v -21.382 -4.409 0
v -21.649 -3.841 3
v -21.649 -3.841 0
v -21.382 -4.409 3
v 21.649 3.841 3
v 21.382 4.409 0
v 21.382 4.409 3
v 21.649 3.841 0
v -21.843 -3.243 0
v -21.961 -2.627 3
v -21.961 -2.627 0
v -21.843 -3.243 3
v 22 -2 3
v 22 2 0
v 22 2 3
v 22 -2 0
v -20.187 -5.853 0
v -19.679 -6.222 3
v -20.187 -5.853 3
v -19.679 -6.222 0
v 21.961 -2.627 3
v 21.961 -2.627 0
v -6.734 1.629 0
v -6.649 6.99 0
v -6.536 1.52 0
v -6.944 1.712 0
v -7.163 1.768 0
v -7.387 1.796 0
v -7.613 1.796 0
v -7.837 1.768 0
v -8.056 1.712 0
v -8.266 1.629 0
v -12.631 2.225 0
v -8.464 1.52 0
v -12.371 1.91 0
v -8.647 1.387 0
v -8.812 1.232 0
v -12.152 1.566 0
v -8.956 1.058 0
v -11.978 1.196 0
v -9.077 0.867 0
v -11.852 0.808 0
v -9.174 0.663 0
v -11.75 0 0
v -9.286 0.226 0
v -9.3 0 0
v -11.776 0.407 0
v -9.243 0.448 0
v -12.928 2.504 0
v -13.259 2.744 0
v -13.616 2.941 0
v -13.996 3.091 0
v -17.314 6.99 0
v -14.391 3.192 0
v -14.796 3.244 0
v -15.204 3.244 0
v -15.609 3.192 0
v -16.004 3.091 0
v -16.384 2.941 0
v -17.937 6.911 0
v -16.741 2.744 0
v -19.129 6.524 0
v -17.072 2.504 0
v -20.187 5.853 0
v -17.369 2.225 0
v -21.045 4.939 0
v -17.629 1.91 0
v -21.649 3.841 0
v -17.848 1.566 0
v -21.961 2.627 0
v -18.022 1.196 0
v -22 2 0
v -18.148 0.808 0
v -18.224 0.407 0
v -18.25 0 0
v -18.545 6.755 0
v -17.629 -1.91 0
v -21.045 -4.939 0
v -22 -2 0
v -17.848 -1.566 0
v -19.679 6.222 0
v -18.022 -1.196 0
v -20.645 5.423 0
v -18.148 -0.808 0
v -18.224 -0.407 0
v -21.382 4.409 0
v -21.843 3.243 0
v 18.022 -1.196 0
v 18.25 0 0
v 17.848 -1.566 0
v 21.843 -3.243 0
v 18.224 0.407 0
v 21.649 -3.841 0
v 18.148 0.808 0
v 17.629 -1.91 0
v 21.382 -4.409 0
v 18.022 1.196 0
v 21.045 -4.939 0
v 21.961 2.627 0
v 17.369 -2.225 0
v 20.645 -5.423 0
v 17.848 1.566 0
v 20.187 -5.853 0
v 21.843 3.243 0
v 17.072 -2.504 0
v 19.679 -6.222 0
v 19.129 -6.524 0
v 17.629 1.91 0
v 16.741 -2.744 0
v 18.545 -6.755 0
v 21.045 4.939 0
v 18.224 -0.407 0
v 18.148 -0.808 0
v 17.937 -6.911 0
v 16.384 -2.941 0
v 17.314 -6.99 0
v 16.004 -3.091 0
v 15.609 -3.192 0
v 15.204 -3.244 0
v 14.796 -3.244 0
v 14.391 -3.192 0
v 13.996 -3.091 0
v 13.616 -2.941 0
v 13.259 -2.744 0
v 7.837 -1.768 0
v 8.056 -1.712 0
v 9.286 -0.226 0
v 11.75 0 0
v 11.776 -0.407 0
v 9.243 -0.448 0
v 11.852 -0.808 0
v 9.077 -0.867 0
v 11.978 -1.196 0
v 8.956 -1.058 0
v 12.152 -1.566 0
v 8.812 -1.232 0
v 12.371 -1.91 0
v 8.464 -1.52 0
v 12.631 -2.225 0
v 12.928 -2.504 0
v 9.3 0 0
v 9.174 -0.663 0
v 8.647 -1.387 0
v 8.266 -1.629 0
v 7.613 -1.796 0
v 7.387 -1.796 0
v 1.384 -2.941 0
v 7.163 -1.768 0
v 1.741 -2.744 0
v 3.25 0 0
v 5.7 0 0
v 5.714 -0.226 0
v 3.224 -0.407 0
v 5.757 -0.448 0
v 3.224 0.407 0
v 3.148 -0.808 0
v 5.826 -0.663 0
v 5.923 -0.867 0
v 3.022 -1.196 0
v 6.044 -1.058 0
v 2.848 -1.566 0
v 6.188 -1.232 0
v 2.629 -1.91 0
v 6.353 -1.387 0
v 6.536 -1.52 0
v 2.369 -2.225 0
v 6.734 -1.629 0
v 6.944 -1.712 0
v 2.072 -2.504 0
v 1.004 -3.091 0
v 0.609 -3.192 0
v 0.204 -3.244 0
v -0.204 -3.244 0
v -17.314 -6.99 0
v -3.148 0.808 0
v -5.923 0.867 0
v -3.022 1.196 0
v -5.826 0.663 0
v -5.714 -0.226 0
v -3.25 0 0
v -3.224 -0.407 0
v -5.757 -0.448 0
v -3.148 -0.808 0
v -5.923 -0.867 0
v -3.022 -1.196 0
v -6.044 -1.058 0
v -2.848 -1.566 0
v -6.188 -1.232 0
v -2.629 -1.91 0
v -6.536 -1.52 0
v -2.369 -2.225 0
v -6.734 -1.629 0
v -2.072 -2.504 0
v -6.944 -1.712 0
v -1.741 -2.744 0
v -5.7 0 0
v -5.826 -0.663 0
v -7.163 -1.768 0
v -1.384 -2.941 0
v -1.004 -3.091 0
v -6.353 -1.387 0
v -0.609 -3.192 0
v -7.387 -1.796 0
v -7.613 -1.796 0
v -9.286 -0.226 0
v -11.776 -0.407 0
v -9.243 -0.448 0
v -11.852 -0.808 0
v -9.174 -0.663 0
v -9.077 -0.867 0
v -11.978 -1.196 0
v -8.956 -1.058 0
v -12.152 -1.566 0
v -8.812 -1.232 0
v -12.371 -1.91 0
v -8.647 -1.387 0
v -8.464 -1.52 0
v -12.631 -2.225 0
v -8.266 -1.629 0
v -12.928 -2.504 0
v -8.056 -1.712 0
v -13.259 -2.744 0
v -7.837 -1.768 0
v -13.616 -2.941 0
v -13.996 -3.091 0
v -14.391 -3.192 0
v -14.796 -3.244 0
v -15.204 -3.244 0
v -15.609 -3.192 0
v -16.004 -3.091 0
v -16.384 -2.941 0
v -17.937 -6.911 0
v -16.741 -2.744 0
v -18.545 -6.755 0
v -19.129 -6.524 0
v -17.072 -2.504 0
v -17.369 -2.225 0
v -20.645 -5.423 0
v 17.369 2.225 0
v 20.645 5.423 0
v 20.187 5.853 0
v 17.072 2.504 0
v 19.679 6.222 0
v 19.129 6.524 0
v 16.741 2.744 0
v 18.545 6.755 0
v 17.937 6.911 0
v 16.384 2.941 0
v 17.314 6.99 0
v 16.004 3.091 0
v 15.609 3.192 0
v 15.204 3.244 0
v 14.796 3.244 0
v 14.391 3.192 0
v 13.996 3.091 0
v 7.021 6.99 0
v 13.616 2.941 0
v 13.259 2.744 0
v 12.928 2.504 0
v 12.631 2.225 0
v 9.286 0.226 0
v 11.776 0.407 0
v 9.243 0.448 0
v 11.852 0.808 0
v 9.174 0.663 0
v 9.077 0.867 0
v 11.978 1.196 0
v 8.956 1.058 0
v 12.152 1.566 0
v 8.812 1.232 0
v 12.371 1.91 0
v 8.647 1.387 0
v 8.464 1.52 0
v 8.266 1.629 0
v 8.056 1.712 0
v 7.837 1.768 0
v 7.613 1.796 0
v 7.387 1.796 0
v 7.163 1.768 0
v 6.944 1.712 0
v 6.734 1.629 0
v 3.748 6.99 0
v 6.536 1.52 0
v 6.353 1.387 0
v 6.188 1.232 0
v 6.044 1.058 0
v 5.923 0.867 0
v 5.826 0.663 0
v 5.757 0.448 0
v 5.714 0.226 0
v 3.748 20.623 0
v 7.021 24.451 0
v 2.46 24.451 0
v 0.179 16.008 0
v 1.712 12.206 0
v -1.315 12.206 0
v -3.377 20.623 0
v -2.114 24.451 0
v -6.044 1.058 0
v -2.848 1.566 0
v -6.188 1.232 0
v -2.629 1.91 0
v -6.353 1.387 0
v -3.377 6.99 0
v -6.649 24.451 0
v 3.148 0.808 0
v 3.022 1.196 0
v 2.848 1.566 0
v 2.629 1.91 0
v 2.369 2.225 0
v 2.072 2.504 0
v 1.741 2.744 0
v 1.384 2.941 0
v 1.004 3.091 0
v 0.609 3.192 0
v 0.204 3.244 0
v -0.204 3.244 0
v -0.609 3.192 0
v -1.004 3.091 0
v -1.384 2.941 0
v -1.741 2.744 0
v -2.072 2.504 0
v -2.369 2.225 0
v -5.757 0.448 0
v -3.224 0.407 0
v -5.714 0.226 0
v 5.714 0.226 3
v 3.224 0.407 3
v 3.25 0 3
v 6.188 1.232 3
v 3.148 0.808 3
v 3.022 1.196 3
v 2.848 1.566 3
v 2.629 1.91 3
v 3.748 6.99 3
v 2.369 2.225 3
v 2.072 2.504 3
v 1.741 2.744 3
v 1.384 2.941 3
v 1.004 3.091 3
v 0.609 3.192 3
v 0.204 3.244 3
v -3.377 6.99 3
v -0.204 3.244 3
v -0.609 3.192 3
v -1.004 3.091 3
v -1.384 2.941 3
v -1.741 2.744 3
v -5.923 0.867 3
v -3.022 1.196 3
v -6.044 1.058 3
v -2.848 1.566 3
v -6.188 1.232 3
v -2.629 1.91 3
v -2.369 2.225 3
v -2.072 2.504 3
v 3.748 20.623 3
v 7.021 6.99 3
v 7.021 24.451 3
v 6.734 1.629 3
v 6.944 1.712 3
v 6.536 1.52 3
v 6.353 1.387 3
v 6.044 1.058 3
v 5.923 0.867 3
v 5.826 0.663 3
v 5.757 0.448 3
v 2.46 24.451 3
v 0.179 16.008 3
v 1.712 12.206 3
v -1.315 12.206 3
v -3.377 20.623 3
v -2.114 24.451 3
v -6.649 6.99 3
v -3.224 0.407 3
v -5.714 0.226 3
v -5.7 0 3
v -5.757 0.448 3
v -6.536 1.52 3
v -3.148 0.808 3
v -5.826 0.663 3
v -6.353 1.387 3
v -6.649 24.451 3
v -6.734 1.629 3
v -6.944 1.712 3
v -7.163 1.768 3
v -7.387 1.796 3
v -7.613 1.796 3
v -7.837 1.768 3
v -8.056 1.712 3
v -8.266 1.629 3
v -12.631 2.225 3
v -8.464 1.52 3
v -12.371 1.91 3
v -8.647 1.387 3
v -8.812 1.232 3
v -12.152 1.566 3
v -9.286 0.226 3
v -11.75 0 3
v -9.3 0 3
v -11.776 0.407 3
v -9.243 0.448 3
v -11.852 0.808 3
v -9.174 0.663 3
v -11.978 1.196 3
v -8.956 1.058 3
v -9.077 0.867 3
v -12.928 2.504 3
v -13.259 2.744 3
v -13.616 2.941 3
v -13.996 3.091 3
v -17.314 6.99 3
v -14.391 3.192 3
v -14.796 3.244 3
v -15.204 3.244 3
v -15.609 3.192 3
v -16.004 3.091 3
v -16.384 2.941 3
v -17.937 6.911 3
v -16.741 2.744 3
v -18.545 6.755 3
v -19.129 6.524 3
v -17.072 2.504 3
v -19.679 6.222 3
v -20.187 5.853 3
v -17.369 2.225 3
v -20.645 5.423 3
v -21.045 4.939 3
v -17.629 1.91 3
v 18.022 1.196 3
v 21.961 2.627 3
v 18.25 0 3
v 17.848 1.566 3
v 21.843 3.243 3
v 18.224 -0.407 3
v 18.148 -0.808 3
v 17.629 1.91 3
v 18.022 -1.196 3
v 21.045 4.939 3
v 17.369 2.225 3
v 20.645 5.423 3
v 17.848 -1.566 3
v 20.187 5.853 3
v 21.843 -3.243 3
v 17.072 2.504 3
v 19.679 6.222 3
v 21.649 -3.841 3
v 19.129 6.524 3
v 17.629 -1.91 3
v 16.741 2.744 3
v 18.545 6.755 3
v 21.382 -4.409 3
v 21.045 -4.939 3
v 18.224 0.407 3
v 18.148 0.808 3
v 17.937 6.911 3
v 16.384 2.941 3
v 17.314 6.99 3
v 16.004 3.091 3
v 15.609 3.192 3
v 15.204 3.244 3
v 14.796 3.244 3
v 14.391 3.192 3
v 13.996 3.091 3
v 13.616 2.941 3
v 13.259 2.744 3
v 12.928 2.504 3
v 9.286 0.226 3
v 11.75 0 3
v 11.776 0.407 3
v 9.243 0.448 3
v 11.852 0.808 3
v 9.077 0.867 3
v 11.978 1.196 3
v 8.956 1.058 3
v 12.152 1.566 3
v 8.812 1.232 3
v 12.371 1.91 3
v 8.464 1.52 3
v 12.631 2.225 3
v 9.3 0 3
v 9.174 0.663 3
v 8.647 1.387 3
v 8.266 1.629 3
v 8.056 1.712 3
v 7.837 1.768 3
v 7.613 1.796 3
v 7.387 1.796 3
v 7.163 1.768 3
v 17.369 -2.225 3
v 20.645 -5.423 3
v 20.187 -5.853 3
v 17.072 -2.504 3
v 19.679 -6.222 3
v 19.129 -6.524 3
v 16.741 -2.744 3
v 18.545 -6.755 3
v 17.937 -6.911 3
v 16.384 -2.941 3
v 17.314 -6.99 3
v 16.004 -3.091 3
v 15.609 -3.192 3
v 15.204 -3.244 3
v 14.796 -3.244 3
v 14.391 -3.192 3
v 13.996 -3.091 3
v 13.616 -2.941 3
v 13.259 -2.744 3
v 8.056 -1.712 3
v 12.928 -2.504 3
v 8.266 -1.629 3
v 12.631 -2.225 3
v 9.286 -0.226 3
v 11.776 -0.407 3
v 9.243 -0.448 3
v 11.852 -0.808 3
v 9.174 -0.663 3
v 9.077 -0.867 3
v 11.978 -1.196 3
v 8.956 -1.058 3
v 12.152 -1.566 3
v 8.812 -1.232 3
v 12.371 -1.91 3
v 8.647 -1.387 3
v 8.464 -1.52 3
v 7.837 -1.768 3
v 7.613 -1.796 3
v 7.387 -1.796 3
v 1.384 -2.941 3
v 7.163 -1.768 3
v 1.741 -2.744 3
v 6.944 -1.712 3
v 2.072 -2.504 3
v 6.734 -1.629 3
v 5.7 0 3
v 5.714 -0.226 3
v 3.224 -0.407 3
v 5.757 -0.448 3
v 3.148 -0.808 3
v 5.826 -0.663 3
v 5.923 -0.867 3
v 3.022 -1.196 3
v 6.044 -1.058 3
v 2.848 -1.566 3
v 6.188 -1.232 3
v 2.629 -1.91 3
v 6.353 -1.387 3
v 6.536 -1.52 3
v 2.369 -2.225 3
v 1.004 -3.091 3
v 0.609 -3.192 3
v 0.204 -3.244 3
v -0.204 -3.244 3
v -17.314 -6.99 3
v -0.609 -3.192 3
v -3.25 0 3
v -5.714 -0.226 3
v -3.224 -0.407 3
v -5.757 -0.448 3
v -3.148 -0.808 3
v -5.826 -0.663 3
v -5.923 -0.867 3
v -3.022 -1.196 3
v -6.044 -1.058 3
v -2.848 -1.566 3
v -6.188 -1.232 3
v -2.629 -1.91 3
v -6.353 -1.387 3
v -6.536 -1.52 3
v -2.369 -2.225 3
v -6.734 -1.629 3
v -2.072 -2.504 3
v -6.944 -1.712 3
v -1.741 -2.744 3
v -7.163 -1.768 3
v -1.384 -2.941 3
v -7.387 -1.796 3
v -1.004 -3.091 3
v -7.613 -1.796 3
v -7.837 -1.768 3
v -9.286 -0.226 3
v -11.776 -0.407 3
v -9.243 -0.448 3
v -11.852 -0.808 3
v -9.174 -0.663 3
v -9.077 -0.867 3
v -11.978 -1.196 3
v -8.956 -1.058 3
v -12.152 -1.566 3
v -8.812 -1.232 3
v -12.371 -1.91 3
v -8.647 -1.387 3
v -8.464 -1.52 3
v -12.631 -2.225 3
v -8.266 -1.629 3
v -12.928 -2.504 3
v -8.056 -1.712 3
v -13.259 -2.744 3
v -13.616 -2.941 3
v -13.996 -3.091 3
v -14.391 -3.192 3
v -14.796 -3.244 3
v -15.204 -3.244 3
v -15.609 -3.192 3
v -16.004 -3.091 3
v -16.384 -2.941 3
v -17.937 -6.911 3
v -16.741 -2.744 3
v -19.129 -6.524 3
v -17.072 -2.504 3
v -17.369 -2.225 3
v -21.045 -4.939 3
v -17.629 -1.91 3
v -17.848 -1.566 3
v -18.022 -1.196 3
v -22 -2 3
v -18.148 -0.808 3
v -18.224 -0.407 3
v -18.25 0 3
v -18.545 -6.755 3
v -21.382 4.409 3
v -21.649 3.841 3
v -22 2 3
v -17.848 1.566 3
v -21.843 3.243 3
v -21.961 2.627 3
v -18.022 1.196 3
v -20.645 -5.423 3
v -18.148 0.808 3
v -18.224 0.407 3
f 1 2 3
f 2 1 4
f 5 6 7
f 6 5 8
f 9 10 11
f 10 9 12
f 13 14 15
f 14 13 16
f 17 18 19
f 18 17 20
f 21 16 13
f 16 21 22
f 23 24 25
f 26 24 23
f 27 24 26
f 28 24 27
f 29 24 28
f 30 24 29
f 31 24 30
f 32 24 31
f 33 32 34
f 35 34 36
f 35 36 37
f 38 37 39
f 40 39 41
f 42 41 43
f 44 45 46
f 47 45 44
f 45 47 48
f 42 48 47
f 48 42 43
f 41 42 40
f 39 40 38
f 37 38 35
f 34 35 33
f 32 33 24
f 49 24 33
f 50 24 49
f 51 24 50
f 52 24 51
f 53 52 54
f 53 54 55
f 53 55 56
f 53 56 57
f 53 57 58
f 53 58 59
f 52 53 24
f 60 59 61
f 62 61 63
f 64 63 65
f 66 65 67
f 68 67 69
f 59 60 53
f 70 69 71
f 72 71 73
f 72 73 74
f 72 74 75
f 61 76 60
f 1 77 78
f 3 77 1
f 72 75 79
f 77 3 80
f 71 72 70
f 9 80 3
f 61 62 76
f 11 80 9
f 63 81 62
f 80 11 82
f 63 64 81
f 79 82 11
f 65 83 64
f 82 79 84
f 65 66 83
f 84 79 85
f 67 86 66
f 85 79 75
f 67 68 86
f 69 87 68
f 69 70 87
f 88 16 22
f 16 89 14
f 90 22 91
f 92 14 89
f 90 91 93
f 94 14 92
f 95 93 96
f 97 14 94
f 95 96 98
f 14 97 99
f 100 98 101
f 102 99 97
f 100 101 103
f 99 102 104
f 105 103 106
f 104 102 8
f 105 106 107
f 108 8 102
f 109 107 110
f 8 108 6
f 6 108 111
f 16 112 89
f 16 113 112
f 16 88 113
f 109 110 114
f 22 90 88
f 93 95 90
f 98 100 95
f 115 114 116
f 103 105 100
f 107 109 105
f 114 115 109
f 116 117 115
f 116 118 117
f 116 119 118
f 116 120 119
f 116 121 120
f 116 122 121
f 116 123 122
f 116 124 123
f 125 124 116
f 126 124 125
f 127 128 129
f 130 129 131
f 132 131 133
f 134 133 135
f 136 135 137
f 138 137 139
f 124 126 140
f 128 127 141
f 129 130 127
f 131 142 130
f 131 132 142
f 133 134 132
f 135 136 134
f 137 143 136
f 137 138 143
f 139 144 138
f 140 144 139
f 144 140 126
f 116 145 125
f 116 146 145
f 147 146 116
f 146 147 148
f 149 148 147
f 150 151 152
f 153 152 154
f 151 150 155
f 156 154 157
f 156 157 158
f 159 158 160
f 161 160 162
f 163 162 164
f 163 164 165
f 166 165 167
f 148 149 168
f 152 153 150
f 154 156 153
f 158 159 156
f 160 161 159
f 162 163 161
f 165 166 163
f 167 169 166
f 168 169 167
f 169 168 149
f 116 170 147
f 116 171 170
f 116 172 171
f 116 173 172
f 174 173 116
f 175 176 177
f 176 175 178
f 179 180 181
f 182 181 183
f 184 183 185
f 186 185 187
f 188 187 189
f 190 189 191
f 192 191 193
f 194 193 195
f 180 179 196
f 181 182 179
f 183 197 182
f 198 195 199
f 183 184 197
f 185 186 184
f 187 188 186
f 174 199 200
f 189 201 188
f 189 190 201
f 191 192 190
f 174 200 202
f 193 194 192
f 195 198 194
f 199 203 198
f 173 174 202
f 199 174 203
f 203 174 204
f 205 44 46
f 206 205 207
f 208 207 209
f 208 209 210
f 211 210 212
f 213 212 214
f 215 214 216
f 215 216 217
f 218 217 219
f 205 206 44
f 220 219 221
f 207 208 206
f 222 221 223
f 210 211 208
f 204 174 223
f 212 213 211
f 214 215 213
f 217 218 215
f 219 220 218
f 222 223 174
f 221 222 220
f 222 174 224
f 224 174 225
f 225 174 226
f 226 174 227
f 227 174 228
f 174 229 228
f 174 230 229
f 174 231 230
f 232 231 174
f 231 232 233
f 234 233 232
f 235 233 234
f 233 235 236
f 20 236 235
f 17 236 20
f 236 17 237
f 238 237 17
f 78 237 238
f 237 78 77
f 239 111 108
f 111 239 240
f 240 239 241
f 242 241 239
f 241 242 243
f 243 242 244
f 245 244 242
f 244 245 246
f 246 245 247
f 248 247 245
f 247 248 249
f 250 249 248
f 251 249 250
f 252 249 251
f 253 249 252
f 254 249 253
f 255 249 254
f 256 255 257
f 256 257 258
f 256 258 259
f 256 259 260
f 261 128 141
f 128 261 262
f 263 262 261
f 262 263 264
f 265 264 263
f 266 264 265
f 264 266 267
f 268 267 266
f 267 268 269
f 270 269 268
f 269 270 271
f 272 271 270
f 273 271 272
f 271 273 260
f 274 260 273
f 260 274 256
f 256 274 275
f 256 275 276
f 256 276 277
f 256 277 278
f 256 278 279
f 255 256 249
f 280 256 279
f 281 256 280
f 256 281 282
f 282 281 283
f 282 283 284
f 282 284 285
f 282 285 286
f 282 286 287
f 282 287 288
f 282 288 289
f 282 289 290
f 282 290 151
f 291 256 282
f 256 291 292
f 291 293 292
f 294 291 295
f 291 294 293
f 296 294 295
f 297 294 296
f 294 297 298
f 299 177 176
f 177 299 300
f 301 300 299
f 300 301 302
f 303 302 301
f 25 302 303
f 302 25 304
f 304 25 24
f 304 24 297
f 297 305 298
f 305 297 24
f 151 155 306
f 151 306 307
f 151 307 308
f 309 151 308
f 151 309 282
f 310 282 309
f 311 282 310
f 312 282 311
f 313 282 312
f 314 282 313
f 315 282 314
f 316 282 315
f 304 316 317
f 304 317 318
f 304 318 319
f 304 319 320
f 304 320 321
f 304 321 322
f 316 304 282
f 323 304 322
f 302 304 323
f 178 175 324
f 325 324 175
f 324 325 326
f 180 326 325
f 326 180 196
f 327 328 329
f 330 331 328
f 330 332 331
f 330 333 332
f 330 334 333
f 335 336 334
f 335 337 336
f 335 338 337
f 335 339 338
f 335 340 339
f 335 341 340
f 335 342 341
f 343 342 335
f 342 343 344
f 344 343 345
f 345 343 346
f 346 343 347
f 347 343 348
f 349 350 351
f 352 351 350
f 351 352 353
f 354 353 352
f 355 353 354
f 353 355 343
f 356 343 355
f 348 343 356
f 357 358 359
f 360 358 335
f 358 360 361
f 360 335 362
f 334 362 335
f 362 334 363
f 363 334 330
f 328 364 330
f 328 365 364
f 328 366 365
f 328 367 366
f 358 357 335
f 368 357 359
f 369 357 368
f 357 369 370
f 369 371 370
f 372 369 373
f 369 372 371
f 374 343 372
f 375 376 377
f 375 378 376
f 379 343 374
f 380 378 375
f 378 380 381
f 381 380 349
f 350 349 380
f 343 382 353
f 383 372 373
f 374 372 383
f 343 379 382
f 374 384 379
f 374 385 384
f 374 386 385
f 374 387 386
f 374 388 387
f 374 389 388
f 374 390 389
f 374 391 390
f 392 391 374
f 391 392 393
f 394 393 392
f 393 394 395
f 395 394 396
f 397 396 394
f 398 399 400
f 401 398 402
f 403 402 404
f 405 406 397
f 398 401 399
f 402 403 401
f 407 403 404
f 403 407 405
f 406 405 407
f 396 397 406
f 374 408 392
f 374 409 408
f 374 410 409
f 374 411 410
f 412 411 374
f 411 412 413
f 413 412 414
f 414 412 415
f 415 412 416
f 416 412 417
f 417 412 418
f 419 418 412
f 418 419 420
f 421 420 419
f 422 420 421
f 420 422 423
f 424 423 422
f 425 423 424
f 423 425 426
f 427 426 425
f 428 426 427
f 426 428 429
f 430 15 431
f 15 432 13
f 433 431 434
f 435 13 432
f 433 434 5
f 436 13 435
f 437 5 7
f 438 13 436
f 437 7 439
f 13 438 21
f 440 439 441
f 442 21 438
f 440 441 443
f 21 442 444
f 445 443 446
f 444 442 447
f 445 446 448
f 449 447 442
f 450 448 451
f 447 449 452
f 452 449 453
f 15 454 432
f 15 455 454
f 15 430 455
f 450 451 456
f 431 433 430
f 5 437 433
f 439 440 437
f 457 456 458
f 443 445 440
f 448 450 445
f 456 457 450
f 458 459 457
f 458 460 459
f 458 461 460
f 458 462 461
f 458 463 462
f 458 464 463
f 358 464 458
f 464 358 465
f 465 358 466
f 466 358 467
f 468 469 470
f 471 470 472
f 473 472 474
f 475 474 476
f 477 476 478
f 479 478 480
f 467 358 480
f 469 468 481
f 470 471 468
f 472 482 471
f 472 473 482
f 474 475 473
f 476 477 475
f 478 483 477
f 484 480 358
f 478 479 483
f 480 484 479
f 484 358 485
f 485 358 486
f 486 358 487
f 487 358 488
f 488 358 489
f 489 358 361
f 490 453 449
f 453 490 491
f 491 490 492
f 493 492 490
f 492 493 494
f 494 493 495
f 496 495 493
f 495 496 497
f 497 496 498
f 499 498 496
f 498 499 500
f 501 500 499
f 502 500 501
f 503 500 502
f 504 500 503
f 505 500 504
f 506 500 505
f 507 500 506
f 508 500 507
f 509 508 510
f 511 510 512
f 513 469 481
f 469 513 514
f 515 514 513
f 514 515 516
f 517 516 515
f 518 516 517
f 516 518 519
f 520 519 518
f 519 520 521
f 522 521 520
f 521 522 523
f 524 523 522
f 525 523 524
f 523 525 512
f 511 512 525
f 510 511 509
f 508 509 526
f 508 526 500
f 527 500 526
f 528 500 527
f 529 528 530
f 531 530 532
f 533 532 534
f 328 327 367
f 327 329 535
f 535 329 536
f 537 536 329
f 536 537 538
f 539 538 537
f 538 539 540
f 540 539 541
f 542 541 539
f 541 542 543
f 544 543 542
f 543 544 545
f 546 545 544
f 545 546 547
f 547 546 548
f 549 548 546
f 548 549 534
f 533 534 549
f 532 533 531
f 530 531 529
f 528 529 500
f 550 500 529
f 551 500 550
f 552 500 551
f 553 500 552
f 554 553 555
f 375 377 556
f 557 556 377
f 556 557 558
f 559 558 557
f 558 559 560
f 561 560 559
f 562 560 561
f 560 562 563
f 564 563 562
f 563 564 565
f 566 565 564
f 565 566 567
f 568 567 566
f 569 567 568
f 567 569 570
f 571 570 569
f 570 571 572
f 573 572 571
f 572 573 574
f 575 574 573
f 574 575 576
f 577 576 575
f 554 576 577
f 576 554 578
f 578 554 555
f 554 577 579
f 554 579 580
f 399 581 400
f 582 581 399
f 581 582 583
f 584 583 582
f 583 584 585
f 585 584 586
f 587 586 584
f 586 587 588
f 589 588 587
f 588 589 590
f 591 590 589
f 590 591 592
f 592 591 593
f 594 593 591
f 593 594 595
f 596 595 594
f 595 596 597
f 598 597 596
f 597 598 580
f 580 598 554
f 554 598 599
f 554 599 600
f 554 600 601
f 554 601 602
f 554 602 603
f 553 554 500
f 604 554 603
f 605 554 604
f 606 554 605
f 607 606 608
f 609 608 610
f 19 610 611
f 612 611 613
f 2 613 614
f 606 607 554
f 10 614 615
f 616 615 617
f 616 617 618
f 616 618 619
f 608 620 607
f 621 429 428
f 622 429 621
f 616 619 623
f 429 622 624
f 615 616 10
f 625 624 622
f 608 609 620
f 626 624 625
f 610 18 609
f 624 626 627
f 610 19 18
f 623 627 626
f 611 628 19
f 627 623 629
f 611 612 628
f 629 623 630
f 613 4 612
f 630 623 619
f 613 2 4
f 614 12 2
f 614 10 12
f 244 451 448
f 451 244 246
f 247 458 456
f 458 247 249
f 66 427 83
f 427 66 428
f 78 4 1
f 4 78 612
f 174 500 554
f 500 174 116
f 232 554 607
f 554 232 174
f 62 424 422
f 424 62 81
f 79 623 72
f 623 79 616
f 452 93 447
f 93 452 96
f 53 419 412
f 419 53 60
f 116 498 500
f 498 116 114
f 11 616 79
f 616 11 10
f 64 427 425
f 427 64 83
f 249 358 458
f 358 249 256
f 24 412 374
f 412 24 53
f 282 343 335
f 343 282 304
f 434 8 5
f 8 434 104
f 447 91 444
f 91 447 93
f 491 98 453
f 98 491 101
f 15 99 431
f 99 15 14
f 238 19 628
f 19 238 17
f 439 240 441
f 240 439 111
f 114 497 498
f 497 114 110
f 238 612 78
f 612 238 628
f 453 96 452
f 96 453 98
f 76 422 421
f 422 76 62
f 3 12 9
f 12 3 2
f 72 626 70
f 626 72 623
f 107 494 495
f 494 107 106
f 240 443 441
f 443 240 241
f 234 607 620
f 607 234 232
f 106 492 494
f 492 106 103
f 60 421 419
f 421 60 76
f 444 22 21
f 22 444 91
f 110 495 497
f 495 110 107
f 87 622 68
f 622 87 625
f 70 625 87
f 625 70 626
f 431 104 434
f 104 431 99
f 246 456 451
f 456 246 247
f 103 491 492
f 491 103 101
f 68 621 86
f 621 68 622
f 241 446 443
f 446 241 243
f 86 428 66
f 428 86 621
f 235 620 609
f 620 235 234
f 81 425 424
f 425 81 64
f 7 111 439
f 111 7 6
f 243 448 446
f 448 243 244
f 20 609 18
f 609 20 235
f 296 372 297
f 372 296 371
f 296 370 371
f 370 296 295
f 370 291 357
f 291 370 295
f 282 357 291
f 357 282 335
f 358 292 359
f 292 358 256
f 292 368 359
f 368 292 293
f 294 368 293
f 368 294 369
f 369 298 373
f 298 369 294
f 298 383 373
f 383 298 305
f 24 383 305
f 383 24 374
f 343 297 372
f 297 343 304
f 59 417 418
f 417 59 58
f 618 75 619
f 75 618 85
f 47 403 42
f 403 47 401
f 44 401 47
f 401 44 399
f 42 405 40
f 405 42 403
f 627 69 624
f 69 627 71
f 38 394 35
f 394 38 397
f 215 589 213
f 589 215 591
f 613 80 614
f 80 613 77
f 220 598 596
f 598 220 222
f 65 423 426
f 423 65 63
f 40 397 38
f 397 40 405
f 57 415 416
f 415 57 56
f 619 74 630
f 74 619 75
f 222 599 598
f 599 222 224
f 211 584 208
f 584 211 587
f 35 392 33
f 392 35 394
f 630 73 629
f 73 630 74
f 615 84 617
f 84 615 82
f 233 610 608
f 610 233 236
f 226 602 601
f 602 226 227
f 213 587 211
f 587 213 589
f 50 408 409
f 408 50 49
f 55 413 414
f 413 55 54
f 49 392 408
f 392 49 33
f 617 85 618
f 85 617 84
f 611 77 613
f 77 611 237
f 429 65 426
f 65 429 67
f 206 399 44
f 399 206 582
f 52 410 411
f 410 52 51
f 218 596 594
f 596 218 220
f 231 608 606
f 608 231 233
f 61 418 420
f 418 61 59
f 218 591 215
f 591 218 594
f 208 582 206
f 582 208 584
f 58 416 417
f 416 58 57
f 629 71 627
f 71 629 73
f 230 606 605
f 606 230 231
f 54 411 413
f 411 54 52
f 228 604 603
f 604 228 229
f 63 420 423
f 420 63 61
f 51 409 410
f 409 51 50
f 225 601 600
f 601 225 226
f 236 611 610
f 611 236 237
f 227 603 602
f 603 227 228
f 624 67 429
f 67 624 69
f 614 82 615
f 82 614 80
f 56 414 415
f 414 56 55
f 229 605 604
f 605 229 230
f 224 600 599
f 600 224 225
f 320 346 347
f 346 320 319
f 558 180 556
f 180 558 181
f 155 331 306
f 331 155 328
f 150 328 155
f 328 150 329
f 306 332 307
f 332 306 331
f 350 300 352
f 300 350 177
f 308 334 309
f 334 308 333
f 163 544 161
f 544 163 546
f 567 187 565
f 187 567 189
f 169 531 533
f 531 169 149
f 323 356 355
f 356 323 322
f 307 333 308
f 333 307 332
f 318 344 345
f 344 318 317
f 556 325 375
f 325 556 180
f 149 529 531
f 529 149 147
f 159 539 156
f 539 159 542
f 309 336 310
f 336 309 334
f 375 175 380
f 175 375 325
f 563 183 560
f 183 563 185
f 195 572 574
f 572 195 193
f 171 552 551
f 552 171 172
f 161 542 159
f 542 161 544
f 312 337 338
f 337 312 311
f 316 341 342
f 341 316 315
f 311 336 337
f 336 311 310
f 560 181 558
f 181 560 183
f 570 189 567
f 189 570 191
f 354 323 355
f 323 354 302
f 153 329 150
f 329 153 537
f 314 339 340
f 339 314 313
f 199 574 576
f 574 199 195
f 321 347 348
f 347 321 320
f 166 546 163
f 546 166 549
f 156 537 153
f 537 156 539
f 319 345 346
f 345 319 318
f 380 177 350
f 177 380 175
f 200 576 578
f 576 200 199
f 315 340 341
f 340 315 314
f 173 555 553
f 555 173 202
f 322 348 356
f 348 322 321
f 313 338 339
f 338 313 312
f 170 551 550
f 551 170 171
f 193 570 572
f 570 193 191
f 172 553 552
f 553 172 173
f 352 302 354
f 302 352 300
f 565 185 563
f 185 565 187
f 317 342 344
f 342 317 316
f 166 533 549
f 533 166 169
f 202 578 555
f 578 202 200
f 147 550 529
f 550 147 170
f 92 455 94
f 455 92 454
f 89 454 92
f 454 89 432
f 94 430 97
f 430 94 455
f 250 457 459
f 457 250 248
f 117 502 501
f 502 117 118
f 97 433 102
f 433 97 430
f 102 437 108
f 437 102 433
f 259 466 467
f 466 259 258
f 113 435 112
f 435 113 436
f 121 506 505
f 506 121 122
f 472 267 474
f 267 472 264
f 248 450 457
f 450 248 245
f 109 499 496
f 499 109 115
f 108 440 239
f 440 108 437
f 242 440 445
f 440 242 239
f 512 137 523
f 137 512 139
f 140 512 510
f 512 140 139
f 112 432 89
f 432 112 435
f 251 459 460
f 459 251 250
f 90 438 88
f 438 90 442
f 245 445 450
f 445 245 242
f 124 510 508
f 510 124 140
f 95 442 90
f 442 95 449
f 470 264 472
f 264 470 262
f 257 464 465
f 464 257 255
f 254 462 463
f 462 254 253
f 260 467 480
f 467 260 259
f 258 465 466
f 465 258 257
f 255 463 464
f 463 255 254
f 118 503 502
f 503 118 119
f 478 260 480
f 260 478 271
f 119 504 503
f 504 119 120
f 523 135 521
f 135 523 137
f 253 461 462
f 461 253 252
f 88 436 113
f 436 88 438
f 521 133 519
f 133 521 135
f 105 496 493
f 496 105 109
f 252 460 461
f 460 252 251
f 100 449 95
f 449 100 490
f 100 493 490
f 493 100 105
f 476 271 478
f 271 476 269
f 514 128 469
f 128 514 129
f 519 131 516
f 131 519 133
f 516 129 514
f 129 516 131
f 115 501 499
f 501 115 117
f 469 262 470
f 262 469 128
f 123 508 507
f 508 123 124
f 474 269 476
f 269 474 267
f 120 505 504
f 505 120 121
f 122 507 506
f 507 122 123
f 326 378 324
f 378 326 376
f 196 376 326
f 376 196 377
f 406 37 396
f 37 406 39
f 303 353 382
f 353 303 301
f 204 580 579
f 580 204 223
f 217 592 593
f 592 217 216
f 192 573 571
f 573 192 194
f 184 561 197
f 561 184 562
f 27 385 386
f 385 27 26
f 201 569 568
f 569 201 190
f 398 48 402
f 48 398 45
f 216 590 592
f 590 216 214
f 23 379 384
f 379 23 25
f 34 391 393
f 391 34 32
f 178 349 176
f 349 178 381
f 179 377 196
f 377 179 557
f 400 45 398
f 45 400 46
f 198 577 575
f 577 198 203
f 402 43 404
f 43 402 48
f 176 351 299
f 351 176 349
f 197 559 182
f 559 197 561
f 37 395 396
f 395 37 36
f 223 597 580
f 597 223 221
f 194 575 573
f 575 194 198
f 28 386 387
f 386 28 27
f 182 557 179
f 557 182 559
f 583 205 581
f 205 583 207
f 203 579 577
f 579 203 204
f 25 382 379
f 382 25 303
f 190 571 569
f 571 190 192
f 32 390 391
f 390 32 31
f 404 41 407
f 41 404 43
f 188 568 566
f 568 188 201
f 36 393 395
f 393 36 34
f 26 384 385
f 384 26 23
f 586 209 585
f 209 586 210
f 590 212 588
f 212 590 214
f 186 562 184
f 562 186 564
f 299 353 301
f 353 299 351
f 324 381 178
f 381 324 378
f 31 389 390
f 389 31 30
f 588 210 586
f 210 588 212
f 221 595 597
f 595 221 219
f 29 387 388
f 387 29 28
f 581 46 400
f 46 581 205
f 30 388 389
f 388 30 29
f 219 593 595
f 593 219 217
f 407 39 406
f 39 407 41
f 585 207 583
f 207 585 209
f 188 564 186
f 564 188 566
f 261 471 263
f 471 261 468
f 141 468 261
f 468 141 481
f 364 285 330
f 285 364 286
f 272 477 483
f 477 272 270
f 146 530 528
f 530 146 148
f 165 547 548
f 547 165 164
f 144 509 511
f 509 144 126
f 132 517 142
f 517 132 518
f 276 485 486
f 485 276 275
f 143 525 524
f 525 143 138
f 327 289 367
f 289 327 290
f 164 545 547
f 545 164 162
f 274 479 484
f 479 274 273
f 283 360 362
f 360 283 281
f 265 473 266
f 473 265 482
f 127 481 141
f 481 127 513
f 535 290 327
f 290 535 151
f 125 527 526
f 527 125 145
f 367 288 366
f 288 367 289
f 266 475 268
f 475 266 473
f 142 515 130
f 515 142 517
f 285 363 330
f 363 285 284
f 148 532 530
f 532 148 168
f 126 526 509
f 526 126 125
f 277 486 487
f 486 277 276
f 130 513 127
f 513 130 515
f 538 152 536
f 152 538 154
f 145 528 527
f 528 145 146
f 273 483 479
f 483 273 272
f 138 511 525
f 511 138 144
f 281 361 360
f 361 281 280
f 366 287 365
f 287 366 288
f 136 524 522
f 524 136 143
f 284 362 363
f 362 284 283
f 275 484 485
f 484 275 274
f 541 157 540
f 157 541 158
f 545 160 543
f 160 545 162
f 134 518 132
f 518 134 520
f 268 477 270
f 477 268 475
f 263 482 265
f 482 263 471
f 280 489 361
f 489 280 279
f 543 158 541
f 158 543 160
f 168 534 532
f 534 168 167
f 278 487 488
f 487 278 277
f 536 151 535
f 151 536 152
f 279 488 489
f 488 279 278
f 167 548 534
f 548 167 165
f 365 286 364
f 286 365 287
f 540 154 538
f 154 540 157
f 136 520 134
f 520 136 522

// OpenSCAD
$fn = 50;


difference() {
	union() {
		hull() {
			translate(v = [-17.0000000000, 2.0000000000, 0]) {
				cylinder(h = 3, r = 5);
			}
			translate(v = [17.0000000000, 2.0000000000, 0]) {
				cylinder(h = 3, r = 5);
			}
			translate(v = [-17.0000000000, -2.0000000000, 0]) {
				cylinder(h = 3, r = 5);
			}
			translate(v = [17.0000000000, -2.0000000000, 0]) {
				cylinder(h = 3, r = 5);
			}
		}
		translate(v = [0, 24, 0]) {
			linear_extrude(height = 3) {
				text(font = "DejaVu Sans Mono:style=Bold", halign = "center", size = 19.0000000000, text = "M", valign = "top");
			}
		}
	}
	union() {
		translate(v = [-15.0000000000, 0.0000000000, 0]) {
			translate(v = [0, 0, -100]) {
				cylinder(h = 200, r = 3.2500000000);
			}
		}
		translate(v = [0, 0, -100]) {
			cylinder(h = 200, r = 3.2500000000);
		}
		translate(v = [15.0000000000, 0.0000000000, 0]) {
			translate(v = [0, 0, -100]) {
				cylinder(h = 200, r = 3.2500000000);
			}
		}
		translate(v = [-15.0000000000, 0.0000000000, 0]) {
			translate(v = [0, 0, -100]) {
				cylinder(h = 200, r = 1.8000000000);
			}
		}
		translate(v = [-7.5000000000, 0.0000000000, 0]) {
			translate(v = [0, 0, -100]) {
				cylinder(h = 200, r = 1.8000000000);
			}
		}
		translate(v = [0, 0, -100]) {
			cylinder(h = 200, r = 1.8000000000);
		}
		translate(v = [7.5000000000, 0.0000000000, 0]) {
			translate(v = [0, 0, -100]) {
				cylinder(h = 200, r = 1.8000000000);
			}
		}
		translate(v = [15.0000000000, 0.0000000000, 0]) {
			translate(v = [0, 0, -100]) {
				cylinder(h = 200, r = 1.8000000000);
			}
		}
	}
}
